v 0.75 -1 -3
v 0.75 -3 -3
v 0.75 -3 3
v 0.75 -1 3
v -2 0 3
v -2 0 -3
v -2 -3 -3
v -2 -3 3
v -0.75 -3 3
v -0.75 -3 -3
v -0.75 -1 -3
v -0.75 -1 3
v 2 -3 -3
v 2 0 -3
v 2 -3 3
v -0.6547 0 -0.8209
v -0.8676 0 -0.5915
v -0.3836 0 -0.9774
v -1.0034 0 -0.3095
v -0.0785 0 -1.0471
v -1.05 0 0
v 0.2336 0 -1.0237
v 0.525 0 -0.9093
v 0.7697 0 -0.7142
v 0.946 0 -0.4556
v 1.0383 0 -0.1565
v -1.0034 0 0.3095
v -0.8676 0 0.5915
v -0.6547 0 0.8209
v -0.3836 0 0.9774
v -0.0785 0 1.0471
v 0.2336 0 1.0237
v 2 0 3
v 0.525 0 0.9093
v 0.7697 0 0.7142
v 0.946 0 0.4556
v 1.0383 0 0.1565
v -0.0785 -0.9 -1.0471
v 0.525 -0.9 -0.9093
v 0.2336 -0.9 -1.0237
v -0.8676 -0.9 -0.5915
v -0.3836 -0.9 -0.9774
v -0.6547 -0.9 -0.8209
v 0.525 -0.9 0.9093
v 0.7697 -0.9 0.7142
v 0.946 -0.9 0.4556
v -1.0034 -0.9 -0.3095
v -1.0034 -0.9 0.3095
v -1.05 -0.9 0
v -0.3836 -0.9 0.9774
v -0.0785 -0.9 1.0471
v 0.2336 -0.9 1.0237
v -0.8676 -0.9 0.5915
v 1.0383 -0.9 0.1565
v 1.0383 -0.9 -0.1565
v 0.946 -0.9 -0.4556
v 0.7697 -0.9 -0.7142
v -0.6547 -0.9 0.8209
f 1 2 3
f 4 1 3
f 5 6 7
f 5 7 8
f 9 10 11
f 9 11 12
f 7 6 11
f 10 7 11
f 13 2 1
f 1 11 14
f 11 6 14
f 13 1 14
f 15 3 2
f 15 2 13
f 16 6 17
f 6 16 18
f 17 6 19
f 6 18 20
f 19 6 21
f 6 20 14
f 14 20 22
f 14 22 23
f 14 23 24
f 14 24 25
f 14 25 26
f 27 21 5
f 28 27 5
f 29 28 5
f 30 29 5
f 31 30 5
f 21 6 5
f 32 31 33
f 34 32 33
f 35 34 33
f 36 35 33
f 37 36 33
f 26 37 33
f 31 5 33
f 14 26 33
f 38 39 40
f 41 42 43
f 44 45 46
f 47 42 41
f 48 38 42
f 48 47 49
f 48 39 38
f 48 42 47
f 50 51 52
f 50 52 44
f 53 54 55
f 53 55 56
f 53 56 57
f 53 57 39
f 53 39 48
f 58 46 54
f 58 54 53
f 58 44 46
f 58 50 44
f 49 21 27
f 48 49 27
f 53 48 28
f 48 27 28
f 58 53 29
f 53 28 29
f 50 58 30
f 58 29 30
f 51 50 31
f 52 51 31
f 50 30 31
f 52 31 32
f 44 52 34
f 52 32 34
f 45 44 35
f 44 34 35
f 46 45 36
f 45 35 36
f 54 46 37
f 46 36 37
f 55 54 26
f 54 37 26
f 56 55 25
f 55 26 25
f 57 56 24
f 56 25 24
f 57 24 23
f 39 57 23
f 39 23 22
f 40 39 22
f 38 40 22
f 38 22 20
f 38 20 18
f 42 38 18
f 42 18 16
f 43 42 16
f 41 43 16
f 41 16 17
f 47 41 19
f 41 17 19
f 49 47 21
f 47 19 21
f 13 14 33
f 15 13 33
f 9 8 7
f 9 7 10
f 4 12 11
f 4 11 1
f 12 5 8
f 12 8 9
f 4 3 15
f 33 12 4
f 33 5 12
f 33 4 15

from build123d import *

# Parameters (mm, degrees)
F0_W     = 4
F0_H     = 6
F1_DEPTH = 3
F2_W     = 1.5
F2_H     = 6
F3_DEPTH = 2
F4_R     = 1.05
F5_DEPTH = 0.9


with BuildPart() as f1:
    # F0 (on Front) → F1 (new body)
    with BuildSketch(Plane.XZ):
        Rectangle(F0_W, F0_H)
    extrude(amount=F1_DEPTH)

    # F2 (on face) → F3 (cut)
    with BuildSketch(Plane.XZ.offset(3)):
        Rectangle(F2_W, F2_H)
    extrude(amount=-F3_DEPTH, mode=Mode.SUBTRACT)

    # F4 (on face) → F5 (cut)
    with BuildSketch(Plane(origin=(0, 0, 0), x_dir=(-1, 0, 0), z_dir=(0, 1, 0))):
        Circle(F4_R)
    extrude(amount=-F5_DEPTH, mode=Mode.SUBTRACT)


solid = f1.part
